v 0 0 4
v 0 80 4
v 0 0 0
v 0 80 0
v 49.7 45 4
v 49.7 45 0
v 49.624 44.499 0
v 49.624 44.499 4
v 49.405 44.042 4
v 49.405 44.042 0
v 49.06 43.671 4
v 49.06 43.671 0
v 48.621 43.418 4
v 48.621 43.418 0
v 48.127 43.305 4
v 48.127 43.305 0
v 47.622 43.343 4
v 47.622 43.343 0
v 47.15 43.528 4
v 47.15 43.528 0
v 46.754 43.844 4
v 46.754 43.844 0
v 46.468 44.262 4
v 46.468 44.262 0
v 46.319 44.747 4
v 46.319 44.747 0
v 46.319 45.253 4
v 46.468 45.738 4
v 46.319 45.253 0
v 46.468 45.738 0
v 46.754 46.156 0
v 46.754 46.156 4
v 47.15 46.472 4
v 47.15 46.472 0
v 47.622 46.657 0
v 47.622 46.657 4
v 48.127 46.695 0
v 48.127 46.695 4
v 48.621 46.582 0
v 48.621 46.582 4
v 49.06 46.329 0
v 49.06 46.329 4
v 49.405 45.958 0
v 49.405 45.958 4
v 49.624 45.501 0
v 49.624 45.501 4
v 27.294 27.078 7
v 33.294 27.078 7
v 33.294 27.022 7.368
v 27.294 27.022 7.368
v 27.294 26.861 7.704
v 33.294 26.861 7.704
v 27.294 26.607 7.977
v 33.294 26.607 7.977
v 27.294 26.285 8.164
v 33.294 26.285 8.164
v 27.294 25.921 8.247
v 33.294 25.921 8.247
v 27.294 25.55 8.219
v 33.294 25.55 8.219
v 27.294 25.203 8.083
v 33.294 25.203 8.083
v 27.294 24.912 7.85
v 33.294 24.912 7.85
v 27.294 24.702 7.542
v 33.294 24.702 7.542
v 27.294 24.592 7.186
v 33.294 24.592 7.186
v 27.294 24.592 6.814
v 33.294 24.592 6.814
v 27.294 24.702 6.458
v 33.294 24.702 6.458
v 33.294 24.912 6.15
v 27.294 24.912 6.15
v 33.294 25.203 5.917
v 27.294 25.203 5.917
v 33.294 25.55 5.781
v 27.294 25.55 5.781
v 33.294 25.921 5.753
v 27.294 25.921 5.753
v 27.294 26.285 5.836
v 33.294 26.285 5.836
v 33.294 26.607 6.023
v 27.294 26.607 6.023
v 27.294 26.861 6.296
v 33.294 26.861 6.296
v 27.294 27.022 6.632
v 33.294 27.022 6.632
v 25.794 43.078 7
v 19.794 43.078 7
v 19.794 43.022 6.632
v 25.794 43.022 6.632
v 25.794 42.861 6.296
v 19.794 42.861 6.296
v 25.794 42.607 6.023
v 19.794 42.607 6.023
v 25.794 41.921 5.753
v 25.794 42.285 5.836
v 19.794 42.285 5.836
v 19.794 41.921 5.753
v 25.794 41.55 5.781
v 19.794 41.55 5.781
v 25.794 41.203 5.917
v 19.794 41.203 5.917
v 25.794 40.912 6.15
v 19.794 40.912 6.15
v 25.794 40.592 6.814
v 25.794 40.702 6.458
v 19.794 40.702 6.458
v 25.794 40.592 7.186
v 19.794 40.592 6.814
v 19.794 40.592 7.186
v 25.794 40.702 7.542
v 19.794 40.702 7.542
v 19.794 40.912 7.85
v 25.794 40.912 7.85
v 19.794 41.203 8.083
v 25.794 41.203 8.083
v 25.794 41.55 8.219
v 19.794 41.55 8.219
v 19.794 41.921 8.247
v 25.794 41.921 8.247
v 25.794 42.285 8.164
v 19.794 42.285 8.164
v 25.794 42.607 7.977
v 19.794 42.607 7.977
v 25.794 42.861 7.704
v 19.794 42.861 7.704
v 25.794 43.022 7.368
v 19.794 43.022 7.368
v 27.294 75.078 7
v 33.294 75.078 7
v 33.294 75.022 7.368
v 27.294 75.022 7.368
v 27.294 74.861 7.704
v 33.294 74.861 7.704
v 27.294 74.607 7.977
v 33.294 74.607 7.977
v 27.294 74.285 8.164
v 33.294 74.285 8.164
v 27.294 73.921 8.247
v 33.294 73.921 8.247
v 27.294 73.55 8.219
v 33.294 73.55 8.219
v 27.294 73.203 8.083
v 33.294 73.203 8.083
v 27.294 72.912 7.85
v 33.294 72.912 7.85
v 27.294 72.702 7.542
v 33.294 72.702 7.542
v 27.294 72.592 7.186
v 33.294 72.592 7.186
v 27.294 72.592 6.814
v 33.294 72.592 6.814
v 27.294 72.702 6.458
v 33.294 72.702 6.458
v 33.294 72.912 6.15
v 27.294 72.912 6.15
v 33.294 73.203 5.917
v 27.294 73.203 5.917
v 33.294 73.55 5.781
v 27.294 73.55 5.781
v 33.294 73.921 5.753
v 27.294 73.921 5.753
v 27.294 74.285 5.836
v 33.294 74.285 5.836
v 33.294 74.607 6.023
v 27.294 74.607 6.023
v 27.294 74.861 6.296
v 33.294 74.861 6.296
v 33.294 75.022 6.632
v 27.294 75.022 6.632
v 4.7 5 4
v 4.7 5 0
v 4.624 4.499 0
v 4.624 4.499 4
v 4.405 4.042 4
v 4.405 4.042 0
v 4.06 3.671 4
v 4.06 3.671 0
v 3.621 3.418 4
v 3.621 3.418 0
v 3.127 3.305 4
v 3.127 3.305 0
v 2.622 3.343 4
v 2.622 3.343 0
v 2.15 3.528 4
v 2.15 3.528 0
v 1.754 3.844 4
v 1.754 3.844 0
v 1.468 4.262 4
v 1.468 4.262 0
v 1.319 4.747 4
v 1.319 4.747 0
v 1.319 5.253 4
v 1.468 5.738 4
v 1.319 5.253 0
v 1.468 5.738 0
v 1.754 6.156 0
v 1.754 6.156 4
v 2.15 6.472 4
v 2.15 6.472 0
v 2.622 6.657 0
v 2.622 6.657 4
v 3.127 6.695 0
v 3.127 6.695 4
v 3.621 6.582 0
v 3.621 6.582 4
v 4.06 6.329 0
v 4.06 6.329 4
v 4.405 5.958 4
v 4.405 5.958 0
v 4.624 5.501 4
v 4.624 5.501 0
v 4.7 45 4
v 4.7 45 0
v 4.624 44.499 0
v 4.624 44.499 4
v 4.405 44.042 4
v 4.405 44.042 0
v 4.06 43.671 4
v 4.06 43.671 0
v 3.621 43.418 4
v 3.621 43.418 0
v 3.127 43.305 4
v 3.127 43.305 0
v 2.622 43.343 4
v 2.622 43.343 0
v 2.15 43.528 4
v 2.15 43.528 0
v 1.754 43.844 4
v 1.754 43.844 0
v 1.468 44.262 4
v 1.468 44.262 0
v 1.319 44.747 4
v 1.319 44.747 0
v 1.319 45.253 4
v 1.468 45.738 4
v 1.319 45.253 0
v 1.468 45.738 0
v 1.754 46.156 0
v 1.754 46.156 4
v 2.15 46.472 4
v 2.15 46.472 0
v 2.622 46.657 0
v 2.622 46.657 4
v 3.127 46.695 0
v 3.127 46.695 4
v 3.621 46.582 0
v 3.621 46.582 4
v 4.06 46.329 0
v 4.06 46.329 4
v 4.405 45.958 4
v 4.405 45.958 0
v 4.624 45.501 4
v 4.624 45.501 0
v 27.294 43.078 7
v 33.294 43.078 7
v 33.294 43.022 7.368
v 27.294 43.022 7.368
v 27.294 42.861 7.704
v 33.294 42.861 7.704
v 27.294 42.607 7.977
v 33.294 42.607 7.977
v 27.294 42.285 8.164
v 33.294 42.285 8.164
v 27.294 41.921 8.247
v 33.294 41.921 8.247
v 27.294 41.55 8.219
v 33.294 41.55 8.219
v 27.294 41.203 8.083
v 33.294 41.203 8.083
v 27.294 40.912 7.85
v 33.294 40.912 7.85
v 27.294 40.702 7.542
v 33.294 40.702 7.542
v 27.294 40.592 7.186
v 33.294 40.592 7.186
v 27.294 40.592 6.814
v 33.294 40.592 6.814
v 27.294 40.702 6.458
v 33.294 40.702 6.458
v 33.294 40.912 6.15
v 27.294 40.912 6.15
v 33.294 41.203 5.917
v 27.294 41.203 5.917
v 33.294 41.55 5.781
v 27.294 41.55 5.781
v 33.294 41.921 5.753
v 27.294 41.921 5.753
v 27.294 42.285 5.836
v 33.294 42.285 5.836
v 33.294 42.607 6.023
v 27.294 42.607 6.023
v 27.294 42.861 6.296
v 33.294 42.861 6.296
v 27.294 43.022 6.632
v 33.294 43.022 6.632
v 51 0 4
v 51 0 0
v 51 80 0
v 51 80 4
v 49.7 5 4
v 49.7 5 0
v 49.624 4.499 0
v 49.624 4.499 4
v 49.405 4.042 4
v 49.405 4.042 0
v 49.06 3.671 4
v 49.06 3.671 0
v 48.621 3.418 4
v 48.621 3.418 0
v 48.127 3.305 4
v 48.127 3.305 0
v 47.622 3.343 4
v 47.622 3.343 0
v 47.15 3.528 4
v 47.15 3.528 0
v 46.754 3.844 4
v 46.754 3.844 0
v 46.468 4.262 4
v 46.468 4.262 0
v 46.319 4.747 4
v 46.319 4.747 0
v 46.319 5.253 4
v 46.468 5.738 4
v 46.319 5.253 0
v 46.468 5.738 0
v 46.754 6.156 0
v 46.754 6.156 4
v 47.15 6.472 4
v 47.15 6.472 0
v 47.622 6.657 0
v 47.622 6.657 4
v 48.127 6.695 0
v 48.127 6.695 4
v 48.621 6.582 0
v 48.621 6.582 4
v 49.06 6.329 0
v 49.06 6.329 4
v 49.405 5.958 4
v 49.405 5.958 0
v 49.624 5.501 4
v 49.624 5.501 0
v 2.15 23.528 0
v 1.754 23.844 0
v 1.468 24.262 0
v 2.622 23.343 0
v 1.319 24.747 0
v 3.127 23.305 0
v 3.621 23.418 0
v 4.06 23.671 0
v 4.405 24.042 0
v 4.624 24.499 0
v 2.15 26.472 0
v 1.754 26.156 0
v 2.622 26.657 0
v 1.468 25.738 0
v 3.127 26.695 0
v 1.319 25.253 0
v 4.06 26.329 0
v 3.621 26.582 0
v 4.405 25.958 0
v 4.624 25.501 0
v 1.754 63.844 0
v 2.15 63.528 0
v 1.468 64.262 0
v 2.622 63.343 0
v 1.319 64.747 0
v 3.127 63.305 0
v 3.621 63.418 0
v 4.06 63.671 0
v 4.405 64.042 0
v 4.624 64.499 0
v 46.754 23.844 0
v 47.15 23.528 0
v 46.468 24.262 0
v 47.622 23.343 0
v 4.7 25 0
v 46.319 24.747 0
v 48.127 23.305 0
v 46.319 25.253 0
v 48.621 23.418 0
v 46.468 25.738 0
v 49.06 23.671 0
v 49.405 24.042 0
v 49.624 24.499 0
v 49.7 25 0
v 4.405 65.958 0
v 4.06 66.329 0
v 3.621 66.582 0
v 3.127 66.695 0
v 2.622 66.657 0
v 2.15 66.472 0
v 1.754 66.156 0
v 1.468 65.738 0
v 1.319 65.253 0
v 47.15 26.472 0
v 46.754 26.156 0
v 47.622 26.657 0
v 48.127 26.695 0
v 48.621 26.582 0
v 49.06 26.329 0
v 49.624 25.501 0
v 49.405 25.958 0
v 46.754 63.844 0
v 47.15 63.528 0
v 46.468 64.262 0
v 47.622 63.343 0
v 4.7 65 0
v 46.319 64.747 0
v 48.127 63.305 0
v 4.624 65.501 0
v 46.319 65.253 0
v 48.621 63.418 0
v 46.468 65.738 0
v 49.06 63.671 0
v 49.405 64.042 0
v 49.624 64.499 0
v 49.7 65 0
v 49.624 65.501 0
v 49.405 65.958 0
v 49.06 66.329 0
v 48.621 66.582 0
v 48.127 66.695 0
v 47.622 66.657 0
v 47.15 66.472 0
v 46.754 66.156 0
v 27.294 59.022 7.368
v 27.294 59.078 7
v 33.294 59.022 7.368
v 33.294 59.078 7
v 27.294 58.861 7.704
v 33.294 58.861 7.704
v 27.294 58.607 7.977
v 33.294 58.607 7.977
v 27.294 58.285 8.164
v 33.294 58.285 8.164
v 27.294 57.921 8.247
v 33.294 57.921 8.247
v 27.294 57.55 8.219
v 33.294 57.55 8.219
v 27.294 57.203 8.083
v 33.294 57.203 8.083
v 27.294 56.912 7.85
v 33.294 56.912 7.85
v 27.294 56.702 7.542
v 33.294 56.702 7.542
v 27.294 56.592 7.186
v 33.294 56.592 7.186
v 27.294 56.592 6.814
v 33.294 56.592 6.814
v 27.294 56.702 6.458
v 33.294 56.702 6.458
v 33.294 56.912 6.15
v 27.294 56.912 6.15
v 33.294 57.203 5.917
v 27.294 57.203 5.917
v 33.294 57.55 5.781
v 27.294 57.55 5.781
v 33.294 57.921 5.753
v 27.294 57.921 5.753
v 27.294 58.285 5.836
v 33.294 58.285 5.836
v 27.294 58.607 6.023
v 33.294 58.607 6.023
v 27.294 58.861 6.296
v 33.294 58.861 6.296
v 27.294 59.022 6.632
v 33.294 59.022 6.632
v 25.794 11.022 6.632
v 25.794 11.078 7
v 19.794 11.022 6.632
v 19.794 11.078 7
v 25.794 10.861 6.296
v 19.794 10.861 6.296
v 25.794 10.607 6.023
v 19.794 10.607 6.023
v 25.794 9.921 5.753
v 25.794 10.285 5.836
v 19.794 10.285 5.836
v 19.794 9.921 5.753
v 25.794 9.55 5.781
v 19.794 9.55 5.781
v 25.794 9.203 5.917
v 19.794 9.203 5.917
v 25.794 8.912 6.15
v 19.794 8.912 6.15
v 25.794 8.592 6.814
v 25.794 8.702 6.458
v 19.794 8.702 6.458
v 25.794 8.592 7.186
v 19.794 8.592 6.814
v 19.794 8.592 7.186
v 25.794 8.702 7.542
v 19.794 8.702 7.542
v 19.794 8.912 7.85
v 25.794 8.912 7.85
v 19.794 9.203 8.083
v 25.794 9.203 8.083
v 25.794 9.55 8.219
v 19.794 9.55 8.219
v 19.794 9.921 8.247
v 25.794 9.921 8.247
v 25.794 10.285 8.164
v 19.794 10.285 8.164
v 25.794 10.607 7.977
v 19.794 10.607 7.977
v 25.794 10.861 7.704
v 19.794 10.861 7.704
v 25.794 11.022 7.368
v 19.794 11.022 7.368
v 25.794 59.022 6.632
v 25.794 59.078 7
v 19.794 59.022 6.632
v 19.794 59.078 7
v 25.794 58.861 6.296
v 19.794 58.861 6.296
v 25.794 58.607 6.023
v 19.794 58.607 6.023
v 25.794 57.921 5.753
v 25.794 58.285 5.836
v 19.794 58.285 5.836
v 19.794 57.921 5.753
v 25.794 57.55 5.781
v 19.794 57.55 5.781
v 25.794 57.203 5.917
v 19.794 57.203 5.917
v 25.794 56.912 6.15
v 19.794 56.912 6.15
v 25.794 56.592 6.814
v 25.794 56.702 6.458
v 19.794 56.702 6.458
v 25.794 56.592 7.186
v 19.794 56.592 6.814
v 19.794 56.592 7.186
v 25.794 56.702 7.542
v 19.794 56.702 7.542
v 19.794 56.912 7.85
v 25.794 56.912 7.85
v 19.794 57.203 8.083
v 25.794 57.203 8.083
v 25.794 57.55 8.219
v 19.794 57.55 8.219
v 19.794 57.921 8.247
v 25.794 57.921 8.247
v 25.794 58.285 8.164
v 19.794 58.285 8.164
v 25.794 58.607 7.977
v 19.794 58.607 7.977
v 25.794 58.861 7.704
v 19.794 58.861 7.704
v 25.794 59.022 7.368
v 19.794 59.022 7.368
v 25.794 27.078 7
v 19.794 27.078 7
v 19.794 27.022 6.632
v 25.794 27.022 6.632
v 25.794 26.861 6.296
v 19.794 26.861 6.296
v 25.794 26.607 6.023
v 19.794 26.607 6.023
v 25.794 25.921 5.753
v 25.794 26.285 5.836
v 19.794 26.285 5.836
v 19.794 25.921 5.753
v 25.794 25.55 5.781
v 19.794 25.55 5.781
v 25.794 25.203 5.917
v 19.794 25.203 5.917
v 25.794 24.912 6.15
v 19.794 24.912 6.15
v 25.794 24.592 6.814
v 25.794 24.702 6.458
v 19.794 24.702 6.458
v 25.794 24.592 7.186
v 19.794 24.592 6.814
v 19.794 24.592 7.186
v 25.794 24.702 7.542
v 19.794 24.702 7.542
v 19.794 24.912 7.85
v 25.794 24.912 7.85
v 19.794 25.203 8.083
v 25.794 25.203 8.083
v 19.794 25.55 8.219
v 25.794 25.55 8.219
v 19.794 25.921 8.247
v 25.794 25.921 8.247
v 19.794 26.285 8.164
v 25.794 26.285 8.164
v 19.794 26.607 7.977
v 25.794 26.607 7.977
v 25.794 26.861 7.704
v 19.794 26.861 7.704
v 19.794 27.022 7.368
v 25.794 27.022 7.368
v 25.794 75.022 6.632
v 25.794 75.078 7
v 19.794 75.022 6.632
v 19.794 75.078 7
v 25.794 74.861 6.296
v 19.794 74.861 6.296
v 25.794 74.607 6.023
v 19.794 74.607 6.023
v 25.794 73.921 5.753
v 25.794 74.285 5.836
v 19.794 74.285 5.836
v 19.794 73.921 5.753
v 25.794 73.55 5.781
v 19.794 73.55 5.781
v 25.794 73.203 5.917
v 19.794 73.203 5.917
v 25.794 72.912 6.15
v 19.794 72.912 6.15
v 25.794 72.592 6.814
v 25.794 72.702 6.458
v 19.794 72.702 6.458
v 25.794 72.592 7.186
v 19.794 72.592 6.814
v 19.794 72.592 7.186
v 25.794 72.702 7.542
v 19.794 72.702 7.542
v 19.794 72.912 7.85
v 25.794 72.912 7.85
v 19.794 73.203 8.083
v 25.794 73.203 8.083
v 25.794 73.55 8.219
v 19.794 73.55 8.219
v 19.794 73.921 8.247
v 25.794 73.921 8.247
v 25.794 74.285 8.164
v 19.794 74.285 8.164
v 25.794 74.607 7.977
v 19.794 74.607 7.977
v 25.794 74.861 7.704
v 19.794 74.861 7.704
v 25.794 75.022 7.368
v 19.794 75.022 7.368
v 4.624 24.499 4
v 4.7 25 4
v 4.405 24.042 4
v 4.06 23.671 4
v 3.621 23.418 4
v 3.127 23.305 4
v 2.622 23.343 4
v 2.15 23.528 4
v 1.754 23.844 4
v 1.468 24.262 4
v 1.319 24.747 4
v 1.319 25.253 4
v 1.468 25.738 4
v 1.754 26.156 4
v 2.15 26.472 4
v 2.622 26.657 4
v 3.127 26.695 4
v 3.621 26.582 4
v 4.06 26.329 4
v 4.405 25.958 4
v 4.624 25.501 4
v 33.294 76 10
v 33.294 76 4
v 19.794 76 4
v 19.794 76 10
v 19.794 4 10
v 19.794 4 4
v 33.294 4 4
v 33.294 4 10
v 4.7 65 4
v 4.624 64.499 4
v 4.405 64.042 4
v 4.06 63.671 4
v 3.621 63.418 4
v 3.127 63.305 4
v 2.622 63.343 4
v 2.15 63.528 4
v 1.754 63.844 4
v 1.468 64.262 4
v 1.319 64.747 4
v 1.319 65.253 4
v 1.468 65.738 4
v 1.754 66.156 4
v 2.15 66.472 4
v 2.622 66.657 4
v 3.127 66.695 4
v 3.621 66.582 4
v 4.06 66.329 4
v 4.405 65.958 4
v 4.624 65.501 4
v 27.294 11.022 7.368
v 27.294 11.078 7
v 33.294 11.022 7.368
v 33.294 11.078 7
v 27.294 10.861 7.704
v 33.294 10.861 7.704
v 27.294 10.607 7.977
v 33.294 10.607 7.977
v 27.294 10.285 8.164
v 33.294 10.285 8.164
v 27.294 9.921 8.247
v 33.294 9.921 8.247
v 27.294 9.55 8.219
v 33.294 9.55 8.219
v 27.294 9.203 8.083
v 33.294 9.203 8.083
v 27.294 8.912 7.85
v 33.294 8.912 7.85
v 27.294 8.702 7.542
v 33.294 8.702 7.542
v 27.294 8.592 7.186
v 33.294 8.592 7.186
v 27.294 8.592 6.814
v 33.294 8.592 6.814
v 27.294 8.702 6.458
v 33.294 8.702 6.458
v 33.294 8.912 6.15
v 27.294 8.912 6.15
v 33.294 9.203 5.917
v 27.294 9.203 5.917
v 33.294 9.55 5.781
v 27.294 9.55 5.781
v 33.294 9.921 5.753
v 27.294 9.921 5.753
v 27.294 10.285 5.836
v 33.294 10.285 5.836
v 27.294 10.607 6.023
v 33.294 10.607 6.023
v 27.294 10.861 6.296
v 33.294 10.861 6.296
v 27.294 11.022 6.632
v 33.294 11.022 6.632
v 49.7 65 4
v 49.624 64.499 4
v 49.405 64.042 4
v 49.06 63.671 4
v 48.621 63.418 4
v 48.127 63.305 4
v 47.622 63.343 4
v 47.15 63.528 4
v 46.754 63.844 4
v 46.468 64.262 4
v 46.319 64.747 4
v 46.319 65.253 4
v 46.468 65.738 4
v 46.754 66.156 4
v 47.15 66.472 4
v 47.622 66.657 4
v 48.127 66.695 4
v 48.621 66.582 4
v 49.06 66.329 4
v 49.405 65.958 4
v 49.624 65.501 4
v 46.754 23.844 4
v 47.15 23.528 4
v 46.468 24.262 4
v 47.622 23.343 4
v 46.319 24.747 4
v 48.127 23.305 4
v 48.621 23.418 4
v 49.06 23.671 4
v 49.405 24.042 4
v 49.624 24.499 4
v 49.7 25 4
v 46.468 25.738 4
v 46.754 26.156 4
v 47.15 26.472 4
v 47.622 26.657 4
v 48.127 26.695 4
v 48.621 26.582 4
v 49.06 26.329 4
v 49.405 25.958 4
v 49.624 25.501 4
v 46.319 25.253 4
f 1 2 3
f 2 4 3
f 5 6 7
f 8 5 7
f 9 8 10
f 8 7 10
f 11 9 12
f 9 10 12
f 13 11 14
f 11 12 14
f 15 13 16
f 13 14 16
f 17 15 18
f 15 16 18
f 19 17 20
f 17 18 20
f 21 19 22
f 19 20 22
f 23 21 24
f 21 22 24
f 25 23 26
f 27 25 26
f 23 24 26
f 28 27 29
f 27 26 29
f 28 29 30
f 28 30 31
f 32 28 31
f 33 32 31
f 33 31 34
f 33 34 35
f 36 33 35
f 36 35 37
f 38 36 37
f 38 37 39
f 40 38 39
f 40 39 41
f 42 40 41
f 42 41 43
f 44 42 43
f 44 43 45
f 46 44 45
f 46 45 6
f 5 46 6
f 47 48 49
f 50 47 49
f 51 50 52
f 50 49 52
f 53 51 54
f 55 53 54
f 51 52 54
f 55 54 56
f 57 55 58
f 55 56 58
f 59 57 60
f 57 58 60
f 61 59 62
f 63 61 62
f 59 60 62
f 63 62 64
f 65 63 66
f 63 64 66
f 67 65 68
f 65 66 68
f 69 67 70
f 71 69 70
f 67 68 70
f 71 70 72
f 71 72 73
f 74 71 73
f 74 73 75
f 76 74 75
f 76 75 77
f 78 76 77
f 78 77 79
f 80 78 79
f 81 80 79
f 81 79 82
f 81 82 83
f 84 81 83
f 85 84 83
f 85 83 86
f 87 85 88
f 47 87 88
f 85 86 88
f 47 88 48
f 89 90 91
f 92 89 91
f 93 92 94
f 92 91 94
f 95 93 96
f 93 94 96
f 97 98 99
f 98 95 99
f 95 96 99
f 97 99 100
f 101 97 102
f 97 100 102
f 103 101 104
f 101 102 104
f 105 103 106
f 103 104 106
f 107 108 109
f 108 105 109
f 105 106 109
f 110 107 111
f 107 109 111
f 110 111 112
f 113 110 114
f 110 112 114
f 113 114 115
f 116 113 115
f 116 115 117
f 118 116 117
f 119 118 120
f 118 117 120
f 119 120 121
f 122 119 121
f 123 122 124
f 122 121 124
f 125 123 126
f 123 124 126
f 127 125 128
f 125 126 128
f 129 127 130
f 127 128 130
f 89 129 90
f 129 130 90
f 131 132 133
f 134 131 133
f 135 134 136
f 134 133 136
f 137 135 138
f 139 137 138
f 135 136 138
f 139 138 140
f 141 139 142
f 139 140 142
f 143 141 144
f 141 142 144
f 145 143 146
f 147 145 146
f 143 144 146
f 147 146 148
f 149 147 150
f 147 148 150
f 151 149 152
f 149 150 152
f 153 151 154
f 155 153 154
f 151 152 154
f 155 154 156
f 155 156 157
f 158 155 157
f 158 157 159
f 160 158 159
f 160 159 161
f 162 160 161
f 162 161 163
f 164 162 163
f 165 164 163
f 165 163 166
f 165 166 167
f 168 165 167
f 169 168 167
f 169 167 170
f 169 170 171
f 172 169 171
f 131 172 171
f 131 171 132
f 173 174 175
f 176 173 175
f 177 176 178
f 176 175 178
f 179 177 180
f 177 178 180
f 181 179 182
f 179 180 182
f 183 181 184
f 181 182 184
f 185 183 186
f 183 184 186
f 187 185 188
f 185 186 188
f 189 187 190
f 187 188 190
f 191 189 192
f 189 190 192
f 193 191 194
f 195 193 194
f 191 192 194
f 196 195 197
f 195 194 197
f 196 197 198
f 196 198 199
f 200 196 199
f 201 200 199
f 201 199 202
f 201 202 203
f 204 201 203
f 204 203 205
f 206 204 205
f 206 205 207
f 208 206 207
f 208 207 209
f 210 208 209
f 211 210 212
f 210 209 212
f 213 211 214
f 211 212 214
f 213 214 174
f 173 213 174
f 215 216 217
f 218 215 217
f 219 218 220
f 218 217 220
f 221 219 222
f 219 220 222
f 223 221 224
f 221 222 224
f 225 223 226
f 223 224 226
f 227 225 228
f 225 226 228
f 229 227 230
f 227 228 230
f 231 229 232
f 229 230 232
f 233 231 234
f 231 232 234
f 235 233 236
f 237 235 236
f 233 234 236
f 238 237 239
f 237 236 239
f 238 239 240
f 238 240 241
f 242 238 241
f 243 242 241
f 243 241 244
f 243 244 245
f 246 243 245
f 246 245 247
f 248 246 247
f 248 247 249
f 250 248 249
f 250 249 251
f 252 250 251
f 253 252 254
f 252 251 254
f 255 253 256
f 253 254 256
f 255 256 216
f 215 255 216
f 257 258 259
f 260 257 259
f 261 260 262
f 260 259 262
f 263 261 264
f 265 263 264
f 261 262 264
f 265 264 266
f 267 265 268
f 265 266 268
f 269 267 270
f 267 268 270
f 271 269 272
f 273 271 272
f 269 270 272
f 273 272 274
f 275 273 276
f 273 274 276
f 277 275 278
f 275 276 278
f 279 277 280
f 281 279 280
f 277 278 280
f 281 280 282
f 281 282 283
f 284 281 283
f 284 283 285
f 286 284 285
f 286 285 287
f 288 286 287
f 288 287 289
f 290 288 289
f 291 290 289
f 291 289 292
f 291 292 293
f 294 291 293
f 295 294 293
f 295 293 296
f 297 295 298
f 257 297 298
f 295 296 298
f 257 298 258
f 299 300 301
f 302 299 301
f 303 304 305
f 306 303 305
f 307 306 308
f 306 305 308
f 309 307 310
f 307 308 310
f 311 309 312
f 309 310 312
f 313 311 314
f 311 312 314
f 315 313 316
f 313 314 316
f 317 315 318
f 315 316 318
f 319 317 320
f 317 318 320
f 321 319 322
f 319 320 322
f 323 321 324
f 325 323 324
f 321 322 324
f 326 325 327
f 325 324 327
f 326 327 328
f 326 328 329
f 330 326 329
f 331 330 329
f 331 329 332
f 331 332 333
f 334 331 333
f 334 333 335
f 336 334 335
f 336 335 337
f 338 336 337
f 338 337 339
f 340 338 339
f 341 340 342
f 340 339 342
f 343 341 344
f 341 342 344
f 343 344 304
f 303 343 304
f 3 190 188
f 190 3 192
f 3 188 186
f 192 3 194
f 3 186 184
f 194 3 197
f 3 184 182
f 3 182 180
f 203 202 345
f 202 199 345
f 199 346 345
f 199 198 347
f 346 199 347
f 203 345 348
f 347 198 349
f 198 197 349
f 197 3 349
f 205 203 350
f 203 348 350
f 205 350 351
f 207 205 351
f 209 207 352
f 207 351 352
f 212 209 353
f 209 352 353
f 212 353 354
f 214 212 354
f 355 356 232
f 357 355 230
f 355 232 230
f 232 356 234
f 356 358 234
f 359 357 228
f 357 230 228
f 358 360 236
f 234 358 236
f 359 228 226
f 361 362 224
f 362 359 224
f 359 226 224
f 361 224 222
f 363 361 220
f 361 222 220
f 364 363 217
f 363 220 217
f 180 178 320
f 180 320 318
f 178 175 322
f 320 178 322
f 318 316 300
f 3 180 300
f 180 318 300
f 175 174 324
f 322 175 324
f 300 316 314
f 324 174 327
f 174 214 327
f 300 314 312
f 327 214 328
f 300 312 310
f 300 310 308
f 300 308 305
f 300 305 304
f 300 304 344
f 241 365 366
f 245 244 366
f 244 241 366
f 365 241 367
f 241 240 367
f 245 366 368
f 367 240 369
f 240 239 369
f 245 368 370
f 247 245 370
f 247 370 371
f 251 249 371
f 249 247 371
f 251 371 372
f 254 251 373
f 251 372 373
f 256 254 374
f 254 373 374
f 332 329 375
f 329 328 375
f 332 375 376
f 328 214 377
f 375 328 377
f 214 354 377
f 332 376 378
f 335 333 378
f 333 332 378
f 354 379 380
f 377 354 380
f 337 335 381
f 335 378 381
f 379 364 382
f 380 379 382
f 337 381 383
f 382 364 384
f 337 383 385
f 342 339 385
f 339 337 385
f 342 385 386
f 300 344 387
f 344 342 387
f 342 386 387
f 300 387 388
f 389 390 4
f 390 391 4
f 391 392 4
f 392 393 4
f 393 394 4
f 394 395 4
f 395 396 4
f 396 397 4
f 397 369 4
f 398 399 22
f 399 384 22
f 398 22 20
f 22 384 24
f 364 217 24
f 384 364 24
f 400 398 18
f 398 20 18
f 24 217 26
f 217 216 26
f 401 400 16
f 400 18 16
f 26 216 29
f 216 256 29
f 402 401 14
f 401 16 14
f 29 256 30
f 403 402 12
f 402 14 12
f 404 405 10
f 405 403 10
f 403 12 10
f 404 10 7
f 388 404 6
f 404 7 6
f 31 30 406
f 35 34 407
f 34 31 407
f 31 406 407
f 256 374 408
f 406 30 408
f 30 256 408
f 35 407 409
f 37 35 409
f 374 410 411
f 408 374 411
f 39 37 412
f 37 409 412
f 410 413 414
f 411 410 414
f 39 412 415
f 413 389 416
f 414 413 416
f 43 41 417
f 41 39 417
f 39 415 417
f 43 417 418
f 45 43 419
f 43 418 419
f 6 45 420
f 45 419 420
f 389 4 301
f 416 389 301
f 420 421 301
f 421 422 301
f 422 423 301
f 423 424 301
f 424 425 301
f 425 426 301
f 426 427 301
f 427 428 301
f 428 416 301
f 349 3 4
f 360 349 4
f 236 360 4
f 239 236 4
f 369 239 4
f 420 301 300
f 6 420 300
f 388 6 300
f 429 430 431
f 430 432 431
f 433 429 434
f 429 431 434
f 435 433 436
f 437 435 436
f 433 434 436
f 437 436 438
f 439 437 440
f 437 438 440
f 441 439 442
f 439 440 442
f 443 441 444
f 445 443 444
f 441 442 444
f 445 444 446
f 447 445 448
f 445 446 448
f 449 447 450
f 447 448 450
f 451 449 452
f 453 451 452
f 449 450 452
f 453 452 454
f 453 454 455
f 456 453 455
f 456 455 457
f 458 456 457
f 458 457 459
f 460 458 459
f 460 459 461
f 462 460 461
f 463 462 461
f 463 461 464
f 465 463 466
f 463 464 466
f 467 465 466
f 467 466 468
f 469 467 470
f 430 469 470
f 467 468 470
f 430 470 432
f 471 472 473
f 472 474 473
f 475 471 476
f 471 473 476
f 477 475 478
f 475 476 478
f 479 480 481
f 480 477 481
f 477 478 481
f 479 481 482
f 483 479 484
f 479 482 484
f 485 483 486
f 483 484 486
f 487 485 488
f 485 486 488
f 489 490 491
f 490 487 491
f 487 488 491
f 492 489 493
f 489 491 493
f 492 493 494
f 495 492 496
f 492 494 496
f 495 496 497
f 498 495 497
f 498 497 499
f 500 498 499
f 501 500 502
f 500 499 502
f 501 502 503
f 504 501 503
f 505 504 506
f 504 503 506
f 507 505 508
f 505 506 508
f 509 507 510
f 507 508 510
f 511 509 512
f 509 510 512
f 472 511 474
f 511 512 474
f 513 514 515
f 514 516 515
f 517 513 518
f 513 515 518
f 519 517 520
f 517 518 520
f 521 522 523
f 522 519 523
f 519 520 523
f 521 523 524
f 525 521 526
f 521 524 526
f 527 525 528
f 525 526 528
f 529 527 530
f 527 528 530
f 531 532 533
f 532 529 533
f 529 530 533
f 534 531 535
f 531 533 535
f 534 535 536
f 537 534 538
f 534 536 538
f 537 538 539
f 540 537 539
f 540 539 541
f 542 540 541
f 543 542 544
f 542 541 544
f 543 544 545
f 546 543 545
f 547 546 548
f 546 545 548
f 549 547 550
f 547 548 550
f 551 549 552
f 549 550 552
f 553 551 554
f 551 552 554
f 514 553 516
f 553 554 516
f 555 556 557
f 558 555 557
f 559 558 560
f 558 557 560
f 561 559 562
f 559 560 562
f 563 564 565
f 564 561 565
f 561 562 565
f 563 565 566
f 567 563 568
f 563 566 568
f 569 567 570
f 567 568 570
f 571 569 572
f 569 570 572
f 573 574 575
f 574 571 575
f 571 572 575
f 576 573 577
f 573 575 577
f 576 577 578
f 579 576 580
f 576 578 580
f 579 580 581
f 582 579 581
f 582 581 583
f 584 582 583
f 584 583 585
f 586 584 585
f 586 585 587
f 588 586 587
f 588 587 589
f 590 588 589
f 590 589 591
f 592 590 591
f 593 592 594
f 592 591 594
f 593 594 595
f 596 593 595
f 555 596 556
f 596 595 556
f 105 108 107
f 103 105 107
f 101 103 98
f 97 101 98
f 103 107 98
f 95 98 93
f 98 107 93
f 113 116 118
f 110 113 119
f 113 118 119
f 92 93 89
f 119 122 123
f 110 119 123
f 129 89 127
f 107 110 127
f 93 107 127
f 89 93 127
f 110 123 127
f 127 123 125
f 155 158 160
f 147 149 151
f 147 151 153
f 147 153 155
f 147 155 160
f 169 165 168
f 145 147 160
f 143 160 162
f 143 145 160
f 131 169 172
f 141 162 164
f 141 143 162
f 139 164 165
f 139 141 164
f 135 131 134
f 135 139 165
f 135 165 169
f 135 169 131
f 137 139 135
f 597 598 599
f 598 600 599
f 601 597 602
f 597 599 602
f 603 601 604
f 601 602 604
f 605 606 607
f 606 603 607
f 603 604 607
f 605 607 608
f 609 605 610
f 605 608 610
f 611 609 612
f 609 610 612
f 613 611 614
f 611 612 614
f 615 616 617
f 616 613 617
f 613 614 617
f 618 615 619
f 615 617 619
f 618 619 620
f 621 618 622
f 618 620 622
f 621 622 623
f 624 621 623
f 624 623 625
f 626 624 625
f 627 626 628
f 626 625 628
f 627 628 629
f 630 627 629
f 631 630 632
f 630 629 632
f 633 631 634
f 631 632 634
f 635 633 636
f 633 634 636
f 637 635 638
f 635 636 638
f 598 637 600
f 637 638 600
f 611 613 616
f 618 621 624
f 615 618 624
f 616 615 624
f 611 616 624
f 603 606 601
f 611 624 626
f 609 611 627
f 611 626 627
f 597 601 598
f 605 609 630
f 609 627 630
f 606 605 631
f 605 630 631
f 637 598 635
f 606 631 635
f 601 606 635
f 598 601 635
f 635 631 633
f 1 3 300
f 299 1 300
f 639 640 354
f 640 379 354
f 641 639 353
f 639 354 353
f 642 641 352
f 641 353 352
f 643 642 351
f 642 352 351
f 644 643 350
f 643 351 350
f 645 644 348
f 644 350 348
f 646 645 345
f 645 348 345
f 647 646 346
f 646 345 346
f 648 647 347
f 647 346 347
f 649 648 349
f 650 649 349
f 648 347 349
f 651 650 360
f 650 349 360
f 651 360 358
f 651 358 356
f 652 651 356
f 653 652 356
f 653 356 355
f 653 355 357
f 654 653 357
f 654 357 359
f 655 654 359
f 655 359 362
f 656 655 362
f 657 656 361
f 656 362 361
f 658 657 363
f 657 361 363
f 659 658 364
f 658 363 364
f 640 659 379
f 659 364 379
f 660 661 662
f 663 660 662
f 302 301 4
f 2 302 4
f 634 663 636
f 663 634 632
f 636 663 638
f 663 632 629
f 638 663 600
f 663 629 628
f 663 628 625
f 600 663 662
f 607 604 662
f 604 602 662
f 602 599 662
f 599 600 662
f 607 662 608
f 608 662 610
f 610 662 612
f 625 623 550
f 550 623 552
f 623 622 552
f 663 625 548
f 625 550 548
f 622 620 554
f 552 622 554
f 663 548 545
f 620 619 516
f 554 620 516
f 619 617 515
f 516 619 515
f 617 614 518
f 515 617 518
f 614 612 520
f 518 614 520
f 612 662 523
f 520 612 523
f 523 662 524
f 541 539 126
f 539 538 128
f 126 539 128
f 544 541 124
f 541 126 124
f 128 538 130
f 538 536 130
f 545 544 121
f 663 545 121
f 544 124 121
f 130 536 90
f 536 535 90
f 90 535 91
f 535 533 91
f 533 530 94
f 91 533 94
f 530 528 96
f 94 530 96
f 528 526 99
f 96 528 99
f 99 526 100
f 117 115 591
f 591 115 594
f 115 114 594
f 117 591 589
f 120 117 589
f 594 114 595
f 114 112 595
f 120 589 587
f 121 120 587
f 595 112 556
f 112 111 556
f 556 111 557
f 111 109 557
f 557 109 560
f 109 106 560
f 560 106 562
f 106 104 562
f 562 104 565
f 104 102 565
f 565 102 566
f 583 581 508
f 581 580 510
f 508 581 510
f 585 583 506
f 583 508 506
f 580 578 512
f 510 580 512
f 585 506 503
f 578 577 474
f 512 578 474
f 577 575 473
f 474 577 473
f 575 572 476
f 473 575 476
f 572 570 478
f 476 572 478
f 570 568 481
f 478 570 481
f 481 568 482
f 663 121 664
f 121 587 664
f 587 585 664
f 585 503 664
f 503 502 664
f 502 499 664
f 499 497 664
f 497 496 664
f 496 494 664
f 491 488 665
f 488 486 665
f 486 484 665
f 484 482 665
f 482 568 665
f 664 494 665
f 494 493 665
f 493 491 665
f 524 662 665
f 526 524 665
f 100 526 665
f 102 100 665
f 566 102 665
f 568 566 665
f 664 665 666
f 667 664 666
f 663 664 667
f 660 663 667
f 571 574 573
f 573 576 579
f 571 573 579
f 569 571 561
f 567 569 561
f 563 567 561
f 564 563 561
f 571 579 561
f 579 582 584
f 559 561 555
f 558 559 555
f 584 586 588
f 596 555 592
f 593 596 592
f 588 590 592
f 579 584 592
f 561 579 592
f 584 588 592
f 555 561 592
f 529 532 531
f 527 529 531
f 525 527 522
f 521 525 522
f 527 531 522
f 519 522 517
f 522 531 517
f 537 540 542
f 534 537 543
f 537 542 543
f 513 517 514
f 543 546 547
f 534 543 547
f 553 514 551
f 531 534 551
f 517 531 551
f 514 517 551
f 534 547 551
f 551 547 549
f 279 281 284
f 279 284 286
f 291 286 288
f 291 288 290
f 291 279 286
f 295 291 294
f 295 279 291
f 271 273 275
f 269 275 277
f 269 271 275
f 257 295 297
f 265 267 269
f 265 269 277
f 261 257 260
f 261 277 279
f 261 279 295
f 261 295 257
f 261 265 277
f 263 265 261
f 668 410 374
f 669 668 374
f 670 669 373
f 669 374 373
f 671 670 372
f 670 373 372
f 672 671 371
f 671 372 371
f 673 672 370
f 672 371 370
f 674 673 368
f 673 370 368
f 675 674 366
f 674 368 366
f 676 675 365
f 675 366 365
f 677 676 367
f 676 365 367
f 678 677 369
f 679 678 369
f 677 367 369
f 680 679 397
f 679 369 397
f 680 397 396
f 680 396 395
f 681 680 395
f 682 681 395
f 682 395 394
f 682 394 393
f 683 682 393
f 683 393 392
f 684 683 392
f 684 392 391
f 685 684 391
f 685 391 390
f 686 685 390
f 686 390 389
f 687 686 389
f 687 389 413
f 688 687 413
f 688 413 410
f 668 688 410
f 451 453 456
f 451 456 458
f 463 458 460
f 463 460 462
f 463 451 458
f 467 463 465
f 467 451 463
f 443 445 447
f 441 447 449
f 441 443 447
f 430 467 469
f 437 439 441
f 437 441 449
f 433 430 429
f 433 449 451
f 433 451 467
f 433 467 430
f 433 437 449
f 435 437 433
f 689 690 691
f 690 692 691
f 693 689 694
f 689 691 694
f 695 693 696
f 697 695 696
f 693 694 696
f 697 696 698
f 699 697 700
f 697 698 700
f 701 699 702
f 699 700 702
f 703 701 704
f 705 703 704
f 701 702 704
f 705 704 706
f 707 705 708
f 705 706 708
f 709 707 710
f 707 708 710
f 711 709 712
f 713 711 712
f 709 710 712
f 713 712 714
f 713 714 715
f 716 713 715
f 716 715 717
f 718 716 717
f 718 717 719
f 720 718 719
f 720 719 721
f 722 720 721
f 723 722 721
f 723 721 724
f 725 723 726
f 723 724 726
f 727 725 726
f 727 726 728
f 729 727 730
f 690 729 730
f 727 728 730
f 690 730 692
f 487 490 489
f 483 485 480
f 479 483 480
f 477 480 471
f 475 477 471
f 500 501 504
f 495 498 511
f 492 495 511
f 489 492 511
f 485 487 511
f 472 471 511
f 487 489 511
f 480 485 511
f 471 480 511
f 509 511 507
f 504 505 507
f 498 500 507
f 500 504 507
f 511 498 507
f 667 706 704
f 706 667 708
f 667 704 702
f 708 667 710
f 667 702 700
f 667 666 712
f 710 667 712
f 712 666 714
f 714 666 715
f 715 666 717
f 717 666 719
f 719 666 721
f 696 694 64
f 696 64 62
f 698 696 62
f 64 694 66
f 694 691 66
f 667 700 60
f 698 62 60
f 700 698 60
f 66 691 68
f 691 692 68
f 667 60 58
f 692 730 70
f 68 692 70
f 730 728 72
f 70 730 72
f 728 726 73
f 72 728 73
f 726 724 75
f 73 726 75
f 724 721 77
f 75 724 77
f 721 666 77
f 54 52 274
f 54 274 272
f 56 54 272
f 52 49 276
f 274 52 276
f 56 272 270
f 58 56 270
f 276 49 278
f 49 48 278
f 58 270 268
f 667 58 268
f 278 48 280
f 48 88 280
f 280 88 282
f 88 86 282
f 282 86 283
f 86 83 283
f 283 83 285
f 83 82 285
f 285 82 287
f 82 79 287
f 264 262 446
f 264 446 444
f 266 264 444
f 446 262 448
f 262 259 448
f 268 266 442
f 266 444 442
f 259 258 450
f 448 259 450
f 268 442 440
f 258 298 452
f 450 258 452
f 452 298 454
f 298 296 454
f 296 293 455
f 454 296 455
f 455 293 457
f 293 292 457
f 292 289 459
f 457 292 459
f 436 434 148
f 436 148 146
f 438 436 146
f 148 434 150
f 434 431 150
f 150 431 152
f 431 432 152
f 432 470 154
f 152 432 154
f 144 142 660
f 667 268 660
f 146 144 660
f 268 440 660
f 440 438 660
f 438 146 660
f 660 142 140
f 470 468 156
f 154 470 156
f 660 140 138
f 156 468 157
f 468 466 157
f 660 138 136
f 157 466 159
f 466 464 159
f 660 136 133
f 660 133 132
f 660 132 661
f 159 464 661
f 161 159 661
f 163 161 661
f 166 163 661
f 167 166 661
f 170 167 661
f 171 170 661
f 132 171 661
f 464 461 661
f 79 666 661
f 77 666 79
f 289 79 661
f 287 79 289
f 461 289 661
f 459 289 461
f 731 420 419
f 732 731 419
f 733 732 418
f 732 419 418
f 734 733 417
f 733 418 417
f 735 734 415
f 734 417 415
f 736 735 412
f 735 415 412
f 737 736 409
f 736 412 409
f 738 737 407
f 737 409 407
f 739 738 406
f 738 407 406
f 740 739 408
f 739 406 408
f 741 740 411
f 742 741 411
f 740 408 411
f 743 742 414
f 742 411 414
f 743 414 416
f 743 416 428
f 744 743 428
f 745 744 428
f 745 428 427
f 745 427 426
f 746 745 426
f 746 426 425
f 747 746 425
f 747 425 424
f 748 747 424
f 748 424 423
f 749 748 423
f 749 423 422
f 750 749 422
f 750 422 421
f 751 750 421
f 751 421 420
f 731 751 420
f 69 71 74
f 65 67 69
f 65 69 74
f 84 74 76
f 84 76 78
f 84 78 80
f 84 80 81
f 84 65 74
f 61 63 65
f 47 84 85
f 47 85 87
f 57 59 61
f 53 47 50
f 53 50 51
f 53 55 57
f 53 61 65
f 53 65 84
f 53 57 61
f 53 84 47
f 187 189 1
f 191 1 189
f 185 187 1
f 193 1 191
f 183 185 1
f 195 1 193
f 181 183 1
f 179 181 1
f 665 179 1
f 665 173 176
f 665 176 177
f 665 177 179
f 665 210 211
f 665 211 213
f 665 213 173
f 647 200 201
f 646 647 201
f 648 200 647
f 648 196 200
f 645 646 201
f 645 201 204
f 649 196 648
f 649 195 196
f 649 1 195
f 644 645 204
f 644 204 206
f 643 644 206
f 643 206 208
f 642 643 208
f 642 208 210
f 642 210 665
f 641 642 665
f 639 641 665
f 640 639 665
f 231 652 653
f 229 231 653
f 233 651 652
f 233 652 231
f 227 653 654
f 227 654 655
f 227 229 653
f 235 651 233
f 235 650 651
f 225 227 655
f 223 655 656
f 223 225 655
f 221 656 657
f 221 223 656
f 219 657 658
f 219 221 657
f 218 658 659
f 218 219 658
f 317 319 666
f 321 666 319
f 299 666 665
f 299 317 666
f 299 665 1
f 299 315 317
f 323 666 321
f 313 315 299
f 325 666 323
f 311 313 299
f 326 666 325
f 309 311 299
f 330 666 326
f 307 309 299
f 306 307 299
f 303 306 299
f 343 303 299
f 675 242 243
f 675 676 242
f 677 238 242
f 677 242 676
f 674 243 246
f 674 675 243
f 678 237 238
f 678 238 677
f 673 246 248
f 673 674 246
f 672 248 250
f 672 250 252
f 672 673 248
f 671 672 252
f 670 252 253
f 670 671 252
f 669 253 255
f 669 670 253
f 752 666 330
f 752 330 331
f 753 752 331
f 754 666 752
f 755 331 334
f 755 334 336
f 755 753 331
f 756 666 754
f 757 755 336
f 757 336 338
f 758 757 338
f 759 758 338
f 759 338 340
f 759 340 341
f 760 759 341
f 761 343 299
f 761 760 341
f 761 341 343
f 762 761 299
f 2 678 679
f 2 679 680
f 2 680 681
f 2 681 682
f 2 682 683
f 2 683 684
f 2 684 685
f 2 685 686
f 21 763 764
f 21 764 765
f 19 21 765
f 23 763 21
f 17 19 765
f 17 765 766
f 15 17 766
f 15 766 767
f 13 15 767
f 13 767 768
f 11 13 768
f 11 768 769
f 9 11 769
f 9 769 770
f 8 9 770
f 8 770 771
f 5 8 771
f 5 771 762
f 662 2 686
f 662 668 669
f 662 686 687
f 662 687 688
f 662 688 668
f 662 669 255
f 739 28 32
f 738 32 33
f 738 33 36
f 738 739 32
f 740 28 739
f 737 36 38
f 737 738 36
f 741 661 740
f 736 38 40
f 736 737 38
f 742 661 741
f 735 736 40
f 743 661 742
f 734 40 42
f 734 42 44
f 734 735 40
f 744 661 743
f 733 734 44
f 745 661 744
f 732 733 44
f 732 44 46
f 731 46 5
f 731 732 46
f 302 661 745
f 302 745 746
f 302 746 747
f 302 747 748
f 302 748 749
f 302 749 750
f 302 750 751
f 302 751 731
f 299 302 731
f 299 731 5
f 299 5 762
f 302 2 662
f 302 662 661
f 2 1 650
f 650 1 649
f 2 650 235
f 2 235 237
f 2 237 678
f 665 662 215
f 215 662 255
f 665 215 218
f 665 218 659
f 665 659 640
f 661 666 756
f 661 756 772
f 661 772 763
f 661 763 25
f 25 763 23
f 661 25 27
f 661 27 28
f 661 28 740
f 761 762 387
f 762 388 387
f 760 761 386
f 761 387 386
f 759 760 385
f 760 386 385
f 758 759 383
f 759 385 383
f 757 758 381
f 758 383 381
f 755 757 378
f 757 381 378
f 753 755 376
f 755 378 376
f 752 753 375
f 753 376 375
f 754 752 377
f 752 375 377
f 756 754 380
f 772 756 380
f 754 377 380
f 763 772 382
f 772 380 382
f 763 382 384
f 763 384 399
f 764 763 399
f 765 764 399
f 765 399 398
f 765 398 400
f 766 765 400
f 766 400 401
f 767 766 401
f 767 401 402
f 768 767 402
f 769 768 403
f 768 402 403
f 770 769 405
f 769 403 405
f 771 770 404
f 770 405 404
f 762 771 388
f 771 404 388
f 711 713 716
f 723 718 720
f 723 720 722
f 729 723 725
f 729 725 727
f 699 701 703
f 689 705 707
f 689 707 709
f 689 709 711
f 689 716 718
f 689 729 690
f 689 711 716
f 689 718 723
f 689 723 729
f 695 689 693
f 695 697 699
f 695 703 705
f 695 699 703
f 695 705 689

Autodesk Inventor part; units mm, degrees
sketch "Continuous_Solid_Plate_No_Openings_Profile" plane through (0, 0, 0) normal (0, 0, 1) x (1, 0, 0)
  line L0 (0, 0) -> (51, 0)
  line L1 (51, 0) -> (51, 80)
  line L2 (51, 80) -> (0, 80)
  line L3 (0, 80) -> (0, 0)
  dimension "d0" = 51
  dimension "d1" = 80
extrude "Continuous_Solid_Plate_No_Openings" add sketch "Continuous_Solid_Plate_No_Openings_Profile" along normal blind 4
ref_plane "Integral_Raised_Device_Mounting_Boss_StartPlane" through (0, 0, 4) normal (0, 0, 1) x (1, 0, 0)
sketch "Integral_Raised_Device_Mounting_Boss_Profile" plane through (0, 0, 4) normal (0, 0, 1) x (1, 0, 0)
  line L0 (19.7942, 4) -> (33.2942, 4)
  line L1 (33.2942, 4) -> (33.2942, 76)
  line L2 (33.2942, 76) -> (19.7942, 76)
  line L3 (19.7942, 76) -> (19.7942, 4)
  point P0 (0, 0)
  dimension "d5" = 19.7943
  dimension "d6" = 4
  dimension "d7" = 13.5
  dimension "d8" = 72
extrude "Integral_Raised_Device_Mounting_Boss" add sketch "Integral_Raised_Device_Mounting_Boss_Profile" along normal blind 6
sketch "Rod_M3_Clearance_8x_Locations" plane through (0, 0, 0) normal (0, 0, 1) x (1, 0, 0)
  circle A0 centre (3, 5) radius 1.7
  circle A1 centre (3, 25) radius 1.7
  circle A2 centre (3, 45) radius 1.7
  circle A3 centre (3, 65) radius 1.7
  circle A4 centre (48, 5) radius 1.7
  circle A5 centre (48, 25) radius 1.7
  circle A6 centre (48, 45) radius 1.7
  circle A7 centre (48, 65) radius 1.7
  point P0 (0, 0)
  dimension "d11" = 3
  dimension "d12" = 5
  dimension "d13" = 3.4
  dimension "d14" = 3
  dimension "d15" = 25
  dimension "d16" = 3.4
  dimension "d17" = 3
  dimension "d18" = 45
  dimension "d19" = 3.4
  dimension "d20" = 3
  dimension "d21" = 65
  dimension "d22" = 3.4
  dimension "d23" = 48
  dimension "d24" = 5
  dimension "d25" = 3.4
  dimension "d26" = 48
  dimension "d27" = 25
  dimension "d28" = 3.4
  dimension "d29" = 48
  dimension "d30" = 45
  dimension "d31" = 3.4
  dimension "d32" = 48
  dimension "d33" = 65
  dimension "d34" = 3.4
extrude "Rod_M3_Clearance_8x" cut sketch "Rod_M3_Clearance_8x_Locations" along normal through all
ref_plane "Device_Clamp_Face_PositiveX" through (33.2942, 0, 0) normal (1, 0, 0) x (0, 1, 0)
sketch "M3_Side_Tap_Locations_PositiveX" plane through (33.2942, 0, 0) normal (1, 0, 0) x (0, 1, 0)
  circle A0 centre (9.828, 7) radius 1.25
  circle A1 centre (25.828, 7) radius 1.25
  circle A2 centre (41.828, 7) radius 1.25
  circle A3 centre (57.828, 7) radius 1.25
  circle A4 centre (73.828, 7) radius 1.25
  point P0 (0, 0)
  dimension "d38" = 9.828
  dimension "d39" = 7
  dimension "d40" = 2.5
  dimension "d41" = 25.828
  dimension "d42" = 7
  dimension "d43" = 2.5
  dimension "d44" = 41.828
  dimension "d45" = 7
  dimension "d46" = 2.5
  dimension "d47" = 57.828
  dimension "d48" = 7
  dimension "d49" = 2.5
  dimension "d50" = 73.828
  dimension "d51" = 7
  dimension "d52" = 2.5
extrude "Device_Tap_Drills_5x_PositiveX" cut sketch "M3_Side_Tap_Locations_PositiveX" against normal blind 6
thread "Device_M3x0_5_6H_PositiveX_1" size "M3x0.5" class "6H" standard "ISO Metric profile" length 6
thread "Device_M3x0_5_6H_PositiveX_2" size "M3x0.5" class "6H" standard "ISO Metric profile" length 6
thread "Device_M3x0_5_6H_PositiveX_3" size "M3x0.5" class "6H" standard "ISO Metric profile" length 6
thread "Device_M3x0_5_6H_PositiveX_4" size "M3x0.5" class "6H" standard "ISO Metric profile" length 6
thread "Device_M3x0_5_6H_PositiveX_5" size "M3x0.5" class "6H" standard "ISO Metric profile" length 6
ref_plane "Device_Clamp_Face_NegativeX" through (19.7942, 0, 0) normal (1, 0, 0) x (0, 1, 0)
sketch "M3_Side_Tap_Locations_NegativeX" plane through (19.7942, 0, 0) normal (1, 0, 0) x (0, 1, 0)
  circle A0 centre (9.828, 7) radius 1.25
  circle A1 centre (25.828, 7) radius 1.25
  circle A2 centre (41.828, 7) radius 1.25
  circle A3 centre (57.828, 7) radius 1.25
  circle A4 centre (73.828, 7) radius 1.25
  point P0 (0, 0)
  dimension "d66" = 9.828
  dimension "d67" = 7
  dimension "d68" = 2.5
  dimension "d69" = 25.828
  dimension "d70" = 7
  dimension "d71" = 2.5
  dimension "d72" = 41.828
  dimension "d73" = 7
  dimension "d74" = 2.5
  dimension "d75" = 57.828
  dimension "d76" = 7
  dimension "d77" = 2.5
  dimension "d78" = 73.828
  dimension "d79" = 7
  dimension "d80" = 2.5
extrude "Device_Tap_Drills_5x_NegativeX" cut sketch "M3_Side_Tap_Locations_NegativeX" along normal blind 6
thread "Device_M3x0_5_6H_NegativeX_1" size "M3x0.5" class "6H" standard "ISO Metric profile" length 6
thread "Device_M3x0_5_6H_NegativeX_2" size "M3x0.5" class "6H" standard "ISO Metric profile" length 6
thread "Device_M3x0_5_6H_NegativeX_3" size "M3x0.5" class "6H" standard "ISO Metric profile" length 6
thread "Device_M3x0_5_6H_NegativeX_4" size "M3x0.5" class "6H" standard "ISO Metric profile" length 6
thread "Device_M3x0_5_6H_NegativeX_5" size "M3x0.5" class "6H" standard "ISO Metric profile" length 6
equation "\"d0\" = OverallWidth"
equation "\"d1\" = ContactLength"
equation "\"d2\" = BaseThickness"
equation "\"d5\" = FingerStartX"
equation "\"d6\" = FingerEndInset"
equation "\"d7\" = FingerWidth"
equation "\"d8\" = ContactLength - 2 * FingerEndInset"
equation "\"d9\" = FingerThickness"
equation "\"d11\" = 0.5 * RodWidth"
equation "\"d12\" = RodHoleStart + 0 * RodScrewPitch"
equation "\"d13\" = RodClearanceDiameter"
equation "\"d14\" = 0.5 * RodWidth"
equation "\"d15\" = RodHoleStart + RodScrewPitch"
equation "\"d16\" = RodClearanceDiameter"
equation "\"d17\" = 0.5 * RodWidth"
equation "\"d18\" = RodHoleStart + 2 * RodScrewPitch"
equation "\"d19\" = RodClearanceDiameter"
equation "\"d20\" = 0.5 * RodWidth"
equation "\"d21\" = RodHoleStart + 3 * RodScrewPitch"
equation "\"d22\" = RodClearanceDiameter"
equation "\"d23\" = OverallWidth - 0.5 * RodWidth"
equation "\"d24\" = RodHoleStart + 0 * RodScrewPitch"
equation "\"d25\" = RodClearanceDiameter"
equation "\"d26\" = OverallWidth - 0.5 * RodWidth"
equation "\"d27\" = RodHoleStart + RodScrewPitch"
equation "\"d28\" = RodClearanceDiameter"
equation "\"d29\" = OverallWidth - 0.5 * RodWidth"
equation "\"d30\" = RodHoleStart + 2 * RodScrewPitch"
equation "\"d31\" = RodClearanceDiameter"
equation "\"d32\" = OverallWidth - 0.5 * RodWidth"
equation "\"d33\" = RodHoleStart + 3 * RodScrewPitch"
equation "\"d34\" = RodClearanceDiameter"
equation "\"d38\" = ClampFirstY - 2 * ClampPitch"
equation "\"d39\" = ClampHeight"
equation "\"d40\" = TapDrillDiameter"
equation "\"d41\" = ClampFirstY - ClampPitch"
equation "\"d42\" = ClampHeight"
equation "\"d43\" = TapDrillDiameter"
equation "\"d44\" = ClampFirstY + 0 * ClampPitch"
equation "\"d45\" = ClampHeight"
equation "\"d46\" = TapDrillDiameter"
equation "\"d47\" = ClampFirstY + ClampPitch"
equation "\"d48\" = ClampHeight"
equation "\"d49\" = TapDrillDiameter"
equation "\"d50\" = ClampFirstY + 2 * ClampPitch"
equation "\"d51\" = ClampHeight"
equation "\"d52\" = TapDrillDiameter"
equation "\"d53\" = TapDepth"
equation "\"d55\" = TapDepth"
equation "\"d57\" = TapDepth"
equation "\"d59\" = TapDepth"
equation "\"d61\" = TapDepth"
equation "\"d63\" = TapDepth"
equation "\"d66\" = ClampFirstY - 2 * ClampPitch"
equation "\"d67\" = ClampHeight"
equation "\"d68\" = TapDrillDiameter"
equation "\"d69\" = ClampFirstY - ClampPitch"
equation "\"d70\" = ClampHeight"
equation "\"d71\" = TapDrillDiameter"
equation "\"d72\" = ClampFirstY + 0 * ClampPitch"
equation "\"d73\" = ClampHeight"
equation "\"d74\" = TapDrillDiameter"
equation "\"d75\" = ClampFirstY + ClampPitch"
equation "\"d76\" = ClampHeight"
equation "\"d77\" = TapDrillDiameter"
equation "\"d78\" = ClampFirstY + 2 * ClampPitch"
equation "\"d79\" = ClampHeight"
equation "\"d80\" = TapDrillDiameter"
equation "\"d81\" = TapDepth"
equation "\"d83\" = TapDepth"
equation "\"d85\" = TapDepth"
equation "\"d87\" = TapDepth"
equation "\"d89\" = TapDepth"
equation "\"d91\" = TapDepth"
equation "\"OverallWidth\" = 51"
equation "\"RodWidth\" = 6"
equation "\"ContactLength\" = 80"
equation "\"BaseThickness\" = 4"
equation "\"FingerStartX\" = 19.79425"
equation "\"FingerWidth\" = 13.5"
equation "\"FingerThickness\" = 6"
equation "\"FingerEndInset\" = 4"
equation "\"RodClearanceDiameter\" = 3.4"
equation "\"ClampFirstY\" = 41.82802"
equation "\"ClampPitch\" = 16"
equation "\"ClampHeight\" = 7"
equation "\"TapDrillDiameter\" = 2.5"
equation "\"TapDepth\" = 6"
equation "\"RodHoleStart\" = 5"
equation "\"RodScrewPitch\" = 20"
equation "\"d4\" = BaseThickness"
equation "\"d37\" = FingerStartX + FingerWidth"
equation "\"d65\" = FingerStartX"
properties part number "Rod_Holder_Adapter"
